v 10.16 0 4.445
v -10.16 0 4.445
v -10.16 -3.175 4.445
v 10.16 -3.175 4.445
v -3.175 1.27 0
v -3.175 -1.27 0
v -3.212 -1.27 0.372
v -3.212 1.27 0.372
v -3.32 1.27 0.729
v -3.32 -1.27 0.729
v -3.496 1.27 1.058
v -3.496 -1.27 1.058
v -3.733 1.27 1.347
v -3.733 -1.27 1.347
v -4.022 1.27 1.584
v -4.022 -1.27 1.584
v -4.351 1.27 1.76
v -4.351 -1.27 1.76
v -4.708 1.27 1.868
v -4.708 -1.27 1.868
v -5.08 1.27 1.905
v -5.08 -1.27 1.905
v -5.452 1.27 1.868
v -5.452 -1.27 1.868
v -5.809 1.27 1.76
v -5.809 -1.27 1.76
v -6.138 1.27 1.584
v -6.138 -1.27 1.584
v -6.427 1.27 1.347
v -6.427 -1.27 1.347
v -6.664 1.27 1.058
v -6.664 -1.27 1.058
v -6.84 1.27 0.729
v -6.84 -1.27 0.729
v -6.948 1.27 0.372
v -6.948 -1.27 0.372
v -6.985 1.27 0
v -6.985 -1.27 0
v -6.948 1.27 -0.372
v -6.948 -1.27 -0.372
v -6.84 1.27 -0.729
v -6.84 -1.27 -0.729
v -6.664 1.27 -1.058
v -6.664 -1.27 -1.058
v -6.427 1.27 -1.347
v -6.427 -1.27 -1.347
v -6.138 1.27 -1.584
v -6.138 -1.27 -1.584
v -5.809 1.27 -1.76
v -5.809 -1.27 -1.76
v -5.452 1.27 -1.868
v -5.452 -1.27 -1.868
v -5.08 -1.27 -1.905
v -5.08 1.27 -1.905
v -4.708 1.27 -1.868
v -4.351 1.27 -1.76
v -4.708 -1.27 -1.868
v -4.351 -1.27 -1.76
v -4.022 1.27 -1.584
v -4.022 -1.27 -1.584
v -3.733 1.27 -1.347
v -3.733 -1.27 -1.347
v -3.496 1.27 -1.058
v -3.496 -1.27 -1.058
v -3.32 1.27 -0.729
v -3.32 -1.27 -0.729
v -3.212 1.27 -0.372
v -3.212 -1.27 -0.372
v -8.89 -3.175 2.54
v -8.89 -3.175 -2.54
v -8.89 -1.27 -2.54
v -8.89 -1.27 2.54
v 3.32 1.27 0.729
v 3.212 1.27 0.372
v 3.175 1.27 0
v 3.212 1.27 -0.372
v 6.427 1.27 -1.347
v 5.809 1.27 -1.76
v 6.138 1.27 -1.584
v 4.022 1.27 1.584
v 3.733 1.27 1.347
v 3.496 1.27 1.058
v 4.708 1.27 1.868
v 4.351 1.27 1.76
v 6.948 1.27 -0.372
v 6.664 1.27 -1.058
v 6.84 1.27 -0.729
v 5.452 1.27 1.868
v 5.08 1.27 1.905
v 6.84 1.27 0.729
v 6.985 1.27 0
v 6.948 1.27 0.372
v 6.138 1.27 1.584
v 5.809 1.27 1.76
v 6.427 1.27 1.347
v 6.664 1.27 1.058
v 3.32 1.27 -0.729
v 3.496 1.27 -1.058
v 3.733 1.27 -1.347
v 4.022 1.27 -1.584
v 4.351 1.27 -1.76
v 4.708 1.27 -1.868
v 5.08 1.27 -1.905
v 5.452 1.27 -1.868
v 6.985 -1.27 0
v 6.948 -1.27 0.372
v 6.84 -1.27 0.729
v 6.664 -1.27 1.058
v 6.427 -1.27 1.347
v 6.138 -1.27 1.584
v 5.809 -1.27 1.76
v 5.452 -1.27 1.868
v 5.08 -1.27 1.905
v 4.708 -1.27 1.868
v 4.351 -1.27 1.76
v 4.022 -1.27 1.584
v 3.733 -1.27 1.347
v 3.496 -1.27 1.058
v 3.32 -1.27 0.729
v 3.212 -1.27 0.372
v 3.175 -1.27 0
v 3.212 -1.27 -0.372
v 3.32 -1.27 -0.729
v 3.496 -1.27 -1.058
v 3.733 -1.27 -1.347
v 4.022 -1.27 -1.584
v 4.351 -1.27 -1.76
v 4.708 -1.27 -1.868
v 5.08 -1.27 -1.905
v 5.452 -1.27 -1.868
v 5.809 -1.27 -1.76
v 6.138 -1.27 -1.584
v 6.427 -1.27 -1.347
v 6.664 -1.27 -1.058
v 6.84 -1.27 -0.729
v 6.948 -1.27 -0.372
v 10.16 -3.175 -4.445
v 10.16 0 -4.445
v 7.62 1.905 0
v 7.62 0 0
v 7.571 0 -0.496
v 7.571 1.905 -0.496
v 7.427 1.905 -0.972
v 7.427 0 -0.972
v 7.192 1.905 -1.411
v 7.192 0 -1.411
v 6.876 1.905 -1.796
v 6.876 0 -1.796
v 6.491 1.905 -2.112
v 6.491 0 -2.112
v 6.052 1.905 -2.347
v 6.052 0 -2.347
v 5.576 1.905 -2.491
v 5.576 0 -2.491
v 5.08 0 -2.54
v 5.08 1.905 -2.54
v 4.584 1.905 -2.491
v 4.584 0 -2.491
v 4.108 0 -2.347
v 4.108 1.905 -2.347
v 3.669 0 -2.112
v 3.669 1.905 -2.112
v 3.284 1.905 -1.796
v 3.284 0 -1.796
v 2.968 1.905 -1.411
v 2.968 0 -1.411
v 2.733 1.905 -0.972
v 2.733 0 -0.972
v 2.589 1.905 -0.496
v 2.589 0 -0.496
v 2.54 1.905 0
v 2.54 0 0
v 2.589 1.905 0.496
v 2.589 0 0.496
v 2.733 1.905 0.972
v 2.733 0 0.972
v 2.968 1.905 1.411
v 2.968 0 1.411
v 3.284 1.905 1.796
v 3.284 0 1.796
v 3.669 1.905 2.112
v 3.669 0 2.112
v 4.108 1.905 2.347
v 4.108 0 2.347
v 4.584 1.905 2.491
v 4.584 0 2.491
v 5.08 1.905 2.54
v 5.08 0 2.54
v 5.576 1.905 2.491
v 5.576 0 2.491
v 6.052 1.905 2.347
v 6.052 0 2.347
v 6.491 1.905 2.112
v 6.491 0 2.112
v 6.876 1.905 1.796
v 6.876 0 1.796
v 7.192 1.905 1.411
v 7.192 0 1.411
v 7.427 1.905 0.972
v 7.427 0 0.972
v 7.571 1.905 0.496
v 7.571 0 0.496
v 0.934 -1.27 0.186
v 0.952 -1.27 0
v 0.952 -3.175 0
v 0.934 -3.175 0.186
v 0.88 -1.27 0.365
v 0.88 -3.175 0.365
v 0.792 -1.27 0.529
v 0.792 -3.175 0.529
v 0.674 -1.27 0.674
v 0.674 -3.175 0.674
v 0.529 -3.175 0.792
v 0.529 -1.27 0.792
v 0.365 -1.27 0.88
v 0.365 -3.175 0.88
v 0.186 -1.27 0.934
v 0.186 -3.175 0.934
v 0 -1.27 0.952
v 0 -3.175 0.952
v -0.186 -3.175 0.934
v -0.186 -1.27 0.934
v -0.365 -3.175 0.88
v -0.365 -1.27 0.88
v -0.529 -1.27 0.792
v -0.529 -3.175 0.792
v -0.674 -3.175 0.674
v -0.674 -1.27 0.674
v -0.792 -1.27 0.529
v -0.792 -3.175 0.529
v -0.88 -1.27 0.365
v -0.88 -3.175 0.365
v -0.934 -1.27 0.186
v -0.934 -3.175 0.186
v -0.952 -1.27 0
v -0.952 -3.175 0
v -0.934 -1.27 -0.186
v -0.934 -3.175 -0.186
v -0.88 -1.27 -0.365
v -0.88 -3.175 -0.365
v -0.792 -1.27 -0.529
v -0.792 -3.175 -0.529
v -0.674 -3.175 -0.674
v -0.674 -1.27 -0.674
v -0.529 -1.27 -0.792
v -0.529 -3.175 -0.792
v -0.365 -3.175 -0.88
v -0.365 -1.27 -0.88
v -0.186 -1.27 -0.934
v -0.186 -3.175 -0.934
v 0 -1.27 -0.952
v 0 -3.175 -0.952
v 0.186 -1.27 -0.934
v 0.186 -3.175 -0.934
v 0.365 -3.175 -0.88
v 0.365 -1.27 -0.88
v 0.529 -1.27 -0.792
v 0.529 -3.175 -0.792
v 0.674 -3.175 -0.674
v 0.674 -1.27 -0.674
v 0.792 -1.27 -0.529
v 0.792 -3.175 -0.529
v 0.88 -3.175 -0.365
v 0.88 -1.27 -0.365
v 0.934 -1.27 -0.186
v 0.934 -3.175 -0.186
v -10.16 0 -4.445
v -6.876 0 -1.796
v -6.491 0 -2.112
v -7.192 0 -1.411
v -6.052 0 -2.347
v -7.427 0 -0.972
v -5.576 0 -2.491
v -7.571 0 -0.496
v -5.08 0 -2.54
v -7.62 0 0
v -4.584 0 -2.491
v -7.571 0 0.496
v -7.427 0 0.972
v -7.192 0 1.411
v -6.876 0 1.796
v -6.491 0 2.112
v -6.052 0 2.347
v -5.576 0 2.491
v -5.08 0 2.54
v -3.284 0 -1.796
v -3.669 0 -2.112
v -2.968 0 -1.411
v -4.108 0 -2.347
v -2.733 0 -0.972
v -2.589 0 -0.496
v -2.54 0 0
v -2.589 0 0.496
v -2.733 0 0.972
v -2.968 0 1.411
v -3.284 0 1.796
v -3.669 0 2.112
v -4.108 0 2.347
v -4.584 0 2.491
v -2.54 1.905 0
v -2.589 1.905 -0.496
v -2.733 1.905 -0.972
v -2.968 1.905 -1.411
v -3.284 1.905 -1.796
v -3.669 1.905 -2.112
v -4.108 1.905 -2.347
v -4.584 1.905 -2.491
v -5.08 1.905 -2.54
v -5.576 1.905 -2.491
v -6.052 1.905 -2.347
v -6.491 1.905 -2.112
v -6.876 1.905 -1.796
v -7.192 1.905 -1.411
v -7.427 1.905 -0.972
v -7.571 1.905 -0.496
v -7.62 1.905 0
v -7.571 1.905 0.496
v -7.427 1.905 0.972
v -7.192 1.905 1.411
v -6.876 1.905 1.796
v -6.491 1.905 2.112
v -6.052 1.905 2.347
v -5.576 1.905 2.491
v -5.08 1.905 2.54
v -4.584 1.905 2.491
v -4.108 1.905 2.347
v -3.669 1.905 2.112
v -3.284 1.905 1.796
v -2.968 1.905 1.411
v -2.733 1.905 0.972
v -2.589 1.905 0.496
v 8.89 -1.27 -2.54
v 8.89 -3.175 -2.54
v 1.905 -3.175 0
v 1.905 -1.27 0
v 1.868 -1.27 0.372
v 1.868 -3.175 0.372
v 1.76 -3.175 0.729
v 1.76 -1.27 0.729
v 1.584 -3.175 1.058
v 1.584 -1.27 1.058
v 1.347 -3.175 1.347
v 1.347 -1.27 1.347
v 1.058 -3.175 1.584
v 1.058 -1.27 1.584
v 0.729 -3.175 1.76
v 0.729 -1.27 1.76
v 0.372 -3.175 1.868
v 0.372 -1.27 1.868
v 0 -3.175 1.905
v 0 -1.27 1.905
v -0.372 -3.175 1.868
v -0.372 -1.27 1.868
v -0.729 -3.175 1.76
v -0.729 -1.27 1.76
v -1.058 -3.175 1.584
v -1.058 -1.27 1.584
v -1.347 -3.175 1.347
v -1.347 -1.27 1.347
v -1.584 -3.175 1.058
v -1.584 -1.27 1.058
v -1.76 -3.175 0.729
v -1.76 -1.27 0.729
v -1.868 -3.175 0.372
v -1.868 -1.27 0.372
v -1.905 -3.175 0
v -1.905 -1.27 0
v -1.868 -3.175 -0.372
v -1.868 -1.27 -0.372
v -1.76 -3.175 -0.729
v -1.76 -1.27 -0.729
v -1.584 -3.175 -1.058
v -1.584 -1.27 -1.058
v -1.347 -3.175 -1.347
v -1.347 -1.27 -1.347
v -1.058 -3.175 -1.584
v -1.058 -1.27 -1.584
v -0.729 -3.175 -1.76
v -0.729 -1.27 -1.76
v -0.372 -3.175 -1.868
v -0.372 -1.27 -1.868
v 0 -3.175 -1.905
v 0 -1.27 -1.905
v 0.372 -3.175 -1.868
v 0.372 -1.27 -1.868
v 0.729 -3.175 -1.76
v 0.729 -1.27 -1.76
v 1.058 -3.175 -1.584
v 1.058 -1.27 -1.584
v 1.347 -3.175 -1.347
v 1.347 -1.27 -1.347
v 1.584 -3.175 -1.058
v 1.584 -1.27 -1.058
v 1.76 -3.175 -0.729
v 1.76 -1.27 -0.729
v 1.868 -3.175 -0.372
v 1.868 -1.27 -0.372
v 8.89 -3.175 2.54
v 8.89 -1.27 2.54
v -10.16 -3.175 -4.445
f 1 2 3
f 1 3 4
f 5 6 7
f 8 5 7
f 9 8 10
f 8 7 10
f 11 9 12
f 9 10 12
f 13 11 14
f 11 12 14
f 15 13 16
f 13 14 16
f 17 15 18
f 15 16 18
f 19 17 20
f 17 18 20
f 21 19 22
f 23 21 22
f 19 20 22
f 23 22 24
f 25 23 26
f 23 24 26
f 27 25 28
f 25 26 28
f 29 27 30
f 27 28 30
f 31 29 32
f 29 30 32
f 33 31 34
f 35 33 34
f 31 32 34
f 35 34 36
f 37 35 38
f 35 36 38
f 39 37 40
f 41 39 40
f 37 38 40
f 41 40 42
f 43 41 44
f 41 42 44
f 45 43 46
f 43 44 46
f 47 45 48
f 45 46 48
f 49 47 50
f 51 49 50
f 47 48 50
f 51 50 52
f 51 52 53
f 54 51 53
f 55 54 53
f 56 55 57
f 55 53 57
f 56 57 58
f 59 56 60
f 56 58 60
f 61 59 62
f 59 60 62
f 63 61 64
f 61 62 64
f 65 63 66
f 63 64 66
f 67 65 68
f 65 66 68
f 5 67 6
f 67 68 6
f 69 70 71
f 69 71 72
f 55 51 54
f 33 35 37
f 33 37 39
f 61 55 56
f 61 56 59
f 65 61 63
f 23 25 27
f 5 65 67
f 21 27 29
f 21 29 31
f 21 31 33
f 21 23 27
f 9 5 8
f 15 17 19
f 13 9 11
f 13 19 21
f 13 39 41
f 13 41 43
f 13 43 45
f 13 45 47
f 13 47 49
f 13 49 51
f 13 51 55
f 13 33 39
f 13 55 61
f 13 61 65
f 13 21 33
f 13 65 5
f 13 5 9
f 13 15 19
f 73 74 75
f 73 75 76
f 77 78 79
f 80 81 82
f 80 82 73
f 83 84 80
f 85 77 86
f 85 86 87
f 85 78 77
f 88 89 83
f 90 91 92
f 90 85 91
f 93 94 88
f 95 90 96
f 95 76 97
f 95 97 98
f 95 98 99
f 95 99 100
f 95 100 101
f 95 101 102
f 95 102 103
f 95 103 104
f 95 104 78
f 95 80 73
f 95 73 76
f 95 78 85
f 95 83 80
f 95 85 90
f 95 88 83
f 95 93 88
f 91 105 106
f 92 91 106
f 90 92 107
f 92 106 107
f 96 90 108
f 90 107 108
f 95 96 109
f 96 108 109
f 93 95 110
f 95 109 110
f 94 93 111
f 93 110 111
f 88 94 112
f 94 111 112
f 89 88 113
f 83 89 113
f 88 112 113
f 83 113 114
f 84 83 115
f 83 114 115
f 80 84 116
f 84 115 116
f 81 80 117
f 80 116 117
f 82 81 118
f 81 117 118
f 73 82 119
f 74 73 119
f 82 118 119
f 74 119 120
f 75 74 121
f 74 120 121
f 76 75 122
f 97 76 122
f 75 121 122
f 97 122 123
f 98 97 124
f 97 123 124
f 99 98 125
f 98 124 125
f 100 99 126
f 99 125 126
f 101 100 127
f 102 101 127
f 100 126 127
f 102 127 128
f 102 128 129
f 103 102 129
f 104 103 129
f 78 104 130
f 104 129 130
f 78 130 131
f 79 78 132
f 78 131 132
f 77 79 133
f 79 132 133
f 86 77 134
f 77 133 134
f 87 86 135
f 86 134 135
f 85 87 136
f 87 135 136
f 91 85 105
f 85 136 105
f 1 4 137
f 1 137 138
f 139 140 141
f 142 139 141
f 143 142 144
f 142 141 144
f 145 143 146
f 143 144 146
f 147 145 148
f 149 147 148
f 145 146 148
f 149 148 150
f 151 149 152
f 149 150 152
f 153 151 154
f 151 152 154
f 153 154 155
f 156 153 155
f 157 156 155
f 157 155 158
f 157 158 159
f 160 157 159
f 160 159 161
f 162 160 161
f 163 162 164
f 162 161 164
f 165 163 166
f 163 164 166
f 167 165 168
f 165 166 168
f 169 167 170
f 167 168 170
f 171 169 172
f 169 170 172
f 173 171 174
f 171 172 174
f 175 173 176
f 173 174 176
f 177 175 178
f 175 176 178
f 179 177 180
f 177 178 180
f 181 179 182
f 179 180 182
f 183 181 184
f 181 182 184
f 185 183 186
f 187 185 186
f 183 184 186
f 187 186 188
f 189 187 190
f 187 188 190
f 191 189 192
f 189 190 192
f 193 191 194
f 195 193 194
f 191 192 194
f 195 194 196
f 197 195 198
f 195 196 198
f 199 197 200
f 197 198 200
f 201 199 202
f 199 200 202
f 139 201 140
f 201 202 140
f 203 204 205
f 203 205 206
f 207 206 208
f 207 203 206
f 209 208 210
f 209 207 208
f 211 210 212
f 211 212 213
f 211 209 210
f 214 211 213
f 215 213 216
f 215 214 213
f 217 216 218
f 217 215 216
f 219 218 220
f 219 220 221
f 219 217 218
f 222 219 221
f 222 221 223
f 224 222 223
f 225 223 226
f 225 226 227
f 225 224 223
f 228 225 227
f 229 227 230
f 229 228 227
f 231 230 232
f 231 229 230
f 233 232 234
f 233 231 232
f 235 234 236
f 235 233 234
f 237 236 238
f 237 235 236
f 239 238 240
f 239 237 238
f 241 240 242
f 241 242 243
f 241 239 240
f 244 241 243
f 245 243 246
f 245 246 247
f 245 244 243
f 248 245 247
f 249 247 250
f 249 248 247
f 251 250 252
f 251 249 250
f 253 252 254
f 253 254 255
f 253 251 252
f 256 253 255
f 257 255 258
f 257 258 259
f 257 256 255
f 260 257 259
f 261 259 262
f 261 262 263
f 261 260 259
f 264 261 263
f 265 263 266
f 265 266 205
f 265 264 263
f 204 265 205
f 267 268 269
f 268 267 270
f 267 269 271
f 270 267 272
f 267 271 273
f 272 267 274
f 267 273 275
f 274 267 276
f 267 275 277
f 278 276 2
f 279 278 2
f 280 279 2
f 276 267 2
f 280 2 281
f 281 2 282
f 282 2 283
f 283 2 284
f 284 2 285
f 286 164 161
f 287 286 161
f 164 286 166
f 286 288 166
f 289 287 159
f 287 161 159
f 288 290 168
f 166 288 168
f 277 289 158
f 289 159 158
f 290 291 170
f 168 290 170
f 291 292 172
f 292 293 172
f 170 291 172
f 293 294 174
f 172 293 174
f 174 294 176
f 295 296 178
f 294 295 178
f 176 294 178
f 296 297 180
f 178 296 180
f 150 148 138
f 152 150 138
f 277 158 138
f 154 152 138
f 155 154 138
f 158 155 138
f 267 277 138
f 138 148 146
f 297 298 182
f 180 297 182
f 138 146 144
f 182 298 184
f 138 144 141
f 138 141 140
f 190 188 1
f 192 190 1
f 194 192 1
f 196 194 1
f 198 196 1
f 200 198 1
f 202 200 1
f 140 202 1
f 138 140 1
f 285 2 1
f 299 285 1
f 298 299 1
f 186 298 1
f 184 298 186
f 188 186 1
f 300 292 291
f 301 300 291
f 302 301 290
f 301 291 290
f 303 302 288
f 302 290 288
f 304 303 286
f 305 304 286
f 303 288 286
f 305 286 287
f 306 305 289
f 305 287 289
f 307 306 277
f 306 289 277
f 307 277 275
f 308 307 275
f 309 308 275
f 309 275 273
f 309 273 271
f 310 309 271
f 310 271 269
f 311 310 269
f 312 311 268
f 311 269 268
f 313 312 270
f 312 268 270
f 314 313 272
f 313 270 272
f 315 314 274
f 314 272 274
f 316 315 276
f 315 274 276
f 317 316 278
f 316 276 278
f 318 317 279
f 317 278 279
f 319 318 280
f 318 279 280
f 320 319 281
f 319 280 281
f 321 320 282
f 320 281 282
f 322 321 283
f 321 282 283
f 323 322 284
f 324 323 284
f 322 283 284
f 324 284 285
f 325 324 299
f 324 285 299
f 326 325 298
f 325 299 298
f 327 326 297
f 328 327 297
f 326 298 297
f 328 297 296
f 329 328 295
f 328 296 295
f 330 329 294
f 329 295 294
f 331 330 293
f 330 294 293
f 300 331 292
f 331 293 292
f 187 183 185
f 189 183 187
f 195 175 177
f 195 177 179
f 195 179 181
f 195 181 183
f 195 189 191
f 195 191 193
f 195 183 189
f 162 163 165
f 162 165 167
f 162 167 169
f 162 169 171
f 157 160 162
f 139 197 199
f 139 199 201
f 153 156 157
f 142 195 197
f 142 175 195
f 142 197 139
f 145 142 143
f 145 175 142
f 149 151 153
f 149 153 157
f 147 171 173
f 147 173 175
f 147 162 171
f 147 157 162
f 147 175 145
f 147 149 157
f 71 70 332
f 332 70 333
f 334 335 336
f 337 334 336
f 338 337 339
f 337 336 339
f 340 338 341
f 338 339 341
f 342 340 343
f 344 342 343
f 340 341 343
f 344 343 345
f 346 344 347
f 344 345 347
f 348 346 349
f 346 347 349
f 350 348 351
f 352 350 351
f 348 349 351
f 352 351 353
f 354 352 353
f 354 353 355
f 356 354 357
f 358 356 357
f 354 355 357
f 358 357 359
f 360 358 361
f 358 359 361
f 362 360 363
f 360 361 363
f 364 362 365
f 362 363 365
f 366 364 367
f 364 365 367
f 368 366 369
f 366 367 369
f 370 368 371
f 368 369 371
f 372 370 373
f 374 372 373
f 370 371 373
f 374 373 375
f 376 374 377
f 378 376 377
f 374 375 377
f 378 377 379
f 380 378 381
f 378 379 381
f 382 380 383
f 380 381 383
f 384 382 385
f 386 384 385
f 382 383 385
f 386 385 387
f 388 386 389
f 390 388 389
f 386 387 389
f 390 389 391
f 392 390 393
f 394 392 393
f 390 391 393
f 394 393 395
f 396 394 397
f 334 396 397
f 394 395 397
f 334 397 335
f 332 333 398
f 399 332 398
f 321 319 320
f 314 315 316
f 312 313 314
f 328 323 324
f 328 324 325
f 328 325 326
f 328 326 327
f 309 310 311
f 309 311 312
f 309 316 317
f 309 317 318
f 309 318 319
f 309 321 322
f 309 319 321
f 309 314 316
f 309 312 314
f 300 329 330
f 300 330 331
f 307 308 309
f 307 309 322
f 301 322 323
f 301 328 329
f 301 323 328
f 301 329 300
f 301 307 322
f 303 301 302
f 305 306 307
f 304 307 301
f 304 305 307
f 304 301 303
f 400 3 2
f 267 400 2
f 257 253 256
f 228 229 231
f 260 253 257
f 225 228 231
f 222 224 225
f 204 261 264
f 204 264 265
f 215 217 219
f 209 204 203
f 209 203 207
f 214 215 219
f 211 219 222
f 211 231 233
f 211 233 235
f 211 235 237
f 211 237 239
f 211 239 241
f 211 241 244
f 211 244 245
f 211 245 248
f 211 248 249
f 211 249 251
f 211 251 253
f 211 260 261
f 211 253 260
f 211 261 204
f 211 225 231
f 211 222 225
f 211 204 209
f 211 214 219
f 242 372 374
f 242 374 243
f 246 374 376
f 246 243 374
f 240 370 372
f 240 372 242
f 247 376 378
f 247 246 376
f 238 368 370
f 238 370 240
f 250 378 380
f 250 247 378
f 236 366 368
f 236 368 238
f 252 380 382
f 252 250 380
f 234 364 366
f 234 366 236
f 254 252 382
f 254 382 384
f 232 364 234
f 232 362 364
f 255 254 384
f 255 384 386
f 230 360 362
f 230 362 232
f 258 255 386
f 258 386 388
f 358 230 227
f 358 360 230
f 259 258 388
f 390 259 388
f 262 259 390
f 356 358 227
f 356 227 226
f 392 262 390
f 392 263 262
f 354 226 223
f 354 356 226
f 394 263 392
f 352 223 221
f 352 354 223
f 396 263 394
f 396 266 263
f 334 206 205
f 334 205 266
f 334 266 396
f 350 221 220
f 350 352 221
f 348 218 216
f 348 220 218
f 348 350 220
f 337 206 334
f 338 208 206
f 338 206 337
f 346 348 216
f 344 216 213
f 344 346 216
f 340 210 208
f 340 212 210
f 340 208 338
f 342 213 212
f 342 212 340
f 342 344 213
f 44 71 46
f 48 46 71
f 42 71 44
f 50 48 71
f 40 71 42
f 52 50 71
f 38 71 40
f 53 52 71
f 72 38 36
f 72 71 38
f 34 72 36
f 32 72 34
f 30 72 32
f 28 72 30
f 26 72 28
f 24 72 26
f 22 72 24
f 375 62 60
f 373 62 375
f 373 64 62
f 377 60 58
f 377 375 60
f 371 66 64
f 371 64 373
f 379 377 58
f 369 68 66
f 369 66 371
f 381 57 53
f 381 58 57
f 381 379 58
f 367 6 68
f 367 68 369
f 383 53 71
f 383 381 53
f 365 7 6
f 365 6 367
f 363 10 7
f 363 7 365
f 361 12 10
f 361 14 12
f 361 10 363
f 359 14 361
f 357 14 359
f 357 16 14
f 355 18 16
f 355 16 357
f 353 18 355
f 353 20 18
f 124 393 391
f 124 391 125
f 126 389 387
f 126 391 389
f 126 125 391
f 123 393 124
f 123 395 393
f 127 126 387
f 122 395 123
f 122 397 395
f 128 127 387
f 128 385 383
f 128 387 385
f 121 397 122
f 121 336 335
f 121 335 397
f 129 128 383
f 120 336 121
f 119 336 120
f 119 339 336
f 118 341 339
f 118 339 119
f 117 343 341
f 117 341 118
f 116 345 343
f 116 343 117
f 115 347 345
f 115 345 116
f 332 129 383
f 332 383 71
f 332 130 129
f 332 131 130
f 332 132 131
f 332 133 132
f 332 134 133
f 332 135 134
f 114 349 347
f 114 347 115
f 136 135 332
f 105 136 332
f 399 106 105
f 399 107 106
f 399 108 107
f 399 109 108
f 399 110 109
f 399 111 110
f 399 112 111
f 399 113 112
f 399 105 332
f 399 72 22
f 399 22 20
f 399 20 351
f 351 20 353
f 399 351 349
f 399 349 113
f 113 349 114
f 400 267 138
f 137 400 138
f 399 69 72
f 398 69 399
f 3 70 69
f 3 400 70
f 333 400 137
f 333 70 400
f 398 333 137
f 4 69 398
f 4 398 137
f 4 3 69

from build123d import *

# Parameters (mm, degrees)
SKETCH1_W           = 20.32
SKETCH1_H           = 3.175
BOSS_EXTRUDE2_DEPTH = 4.445
SKETCH3_R           = 2.54
BOSS_EXTRUDE3_DEPTH = 1.905
SKETCH4_W           = 17.78
SKETCH4_H           = 5.08
CUT_EXTRUDE1_DEPTH  = 1.905
SKETCH5_R           = 1.905
CUT_EXTRUDE2_DEPTH  = 2.54
SKETCH6_R           = 1.905
SKETCH6_R_2         = 0.9525
BOSS_EXTRUDE4_DEPTH = 1.905


with BuildPart() as part:
    # Sketch1 → Boss-Extrude2 (new body, symmetric)
    with BuildSketch(Plane.XY):
        with Locations((0, -1.5875)):
            Rectangle(SKETCH1_W, SKETCH1_H)
    extrude(amount=BOSS_EXTRUDE2_DEPTH, both=True)

    # Sketch3 → Boss-Extrude3 (add)
    with BuildSketch(Plane(origin=(0, 0, 0), x_dir=(1, 0, 0), z_dir=(0, 1, 0))):
        with Locations((-5.08, 0)):
            Circle(SKETCH3_R)
        with Locations((5.08, 0)):
            Circle(SKETCH3_R)
    extrude(amount=BOSS_EXTRUDE3_DEPTH)

    # Sketch4 → Cut-Extrude1 (cut)
    with BuildSketch(Plane.XZ.offset(3.175)):
        Rectangle(SKETCH4_W, SKETCH4_H)
    extrude(amount=-CUT_EXTRUDE1_DEPTH, mode=Mode.SUBTRACT)

    # Sketch5 → Cut-Extrude2 (cut)
    with BuildSketch(Plane.XZ.offset(1.27)):
        with Locations((-5.08, 0)):
            Circle(SKETCH5_R)
        with Locations((5.08, 0)):
            Circle(SKETCH5_R)
    extrude(amount=-CUT_EXTRUDE2_DEPTH, mode=Mode.SUBTRACT)

    # Sketch6 → Boss-Extrude4 (add)
    with BuildSketch(Plane.XZ.offset(1.27)):
        Circle(SKETCH6_R)
        Circle(SKETCH6_R_2, mode=Mode.SUBTRACT)
    extrude(amount=BOSS_EXTRUDE4_DEPTH)


solid = part.part
